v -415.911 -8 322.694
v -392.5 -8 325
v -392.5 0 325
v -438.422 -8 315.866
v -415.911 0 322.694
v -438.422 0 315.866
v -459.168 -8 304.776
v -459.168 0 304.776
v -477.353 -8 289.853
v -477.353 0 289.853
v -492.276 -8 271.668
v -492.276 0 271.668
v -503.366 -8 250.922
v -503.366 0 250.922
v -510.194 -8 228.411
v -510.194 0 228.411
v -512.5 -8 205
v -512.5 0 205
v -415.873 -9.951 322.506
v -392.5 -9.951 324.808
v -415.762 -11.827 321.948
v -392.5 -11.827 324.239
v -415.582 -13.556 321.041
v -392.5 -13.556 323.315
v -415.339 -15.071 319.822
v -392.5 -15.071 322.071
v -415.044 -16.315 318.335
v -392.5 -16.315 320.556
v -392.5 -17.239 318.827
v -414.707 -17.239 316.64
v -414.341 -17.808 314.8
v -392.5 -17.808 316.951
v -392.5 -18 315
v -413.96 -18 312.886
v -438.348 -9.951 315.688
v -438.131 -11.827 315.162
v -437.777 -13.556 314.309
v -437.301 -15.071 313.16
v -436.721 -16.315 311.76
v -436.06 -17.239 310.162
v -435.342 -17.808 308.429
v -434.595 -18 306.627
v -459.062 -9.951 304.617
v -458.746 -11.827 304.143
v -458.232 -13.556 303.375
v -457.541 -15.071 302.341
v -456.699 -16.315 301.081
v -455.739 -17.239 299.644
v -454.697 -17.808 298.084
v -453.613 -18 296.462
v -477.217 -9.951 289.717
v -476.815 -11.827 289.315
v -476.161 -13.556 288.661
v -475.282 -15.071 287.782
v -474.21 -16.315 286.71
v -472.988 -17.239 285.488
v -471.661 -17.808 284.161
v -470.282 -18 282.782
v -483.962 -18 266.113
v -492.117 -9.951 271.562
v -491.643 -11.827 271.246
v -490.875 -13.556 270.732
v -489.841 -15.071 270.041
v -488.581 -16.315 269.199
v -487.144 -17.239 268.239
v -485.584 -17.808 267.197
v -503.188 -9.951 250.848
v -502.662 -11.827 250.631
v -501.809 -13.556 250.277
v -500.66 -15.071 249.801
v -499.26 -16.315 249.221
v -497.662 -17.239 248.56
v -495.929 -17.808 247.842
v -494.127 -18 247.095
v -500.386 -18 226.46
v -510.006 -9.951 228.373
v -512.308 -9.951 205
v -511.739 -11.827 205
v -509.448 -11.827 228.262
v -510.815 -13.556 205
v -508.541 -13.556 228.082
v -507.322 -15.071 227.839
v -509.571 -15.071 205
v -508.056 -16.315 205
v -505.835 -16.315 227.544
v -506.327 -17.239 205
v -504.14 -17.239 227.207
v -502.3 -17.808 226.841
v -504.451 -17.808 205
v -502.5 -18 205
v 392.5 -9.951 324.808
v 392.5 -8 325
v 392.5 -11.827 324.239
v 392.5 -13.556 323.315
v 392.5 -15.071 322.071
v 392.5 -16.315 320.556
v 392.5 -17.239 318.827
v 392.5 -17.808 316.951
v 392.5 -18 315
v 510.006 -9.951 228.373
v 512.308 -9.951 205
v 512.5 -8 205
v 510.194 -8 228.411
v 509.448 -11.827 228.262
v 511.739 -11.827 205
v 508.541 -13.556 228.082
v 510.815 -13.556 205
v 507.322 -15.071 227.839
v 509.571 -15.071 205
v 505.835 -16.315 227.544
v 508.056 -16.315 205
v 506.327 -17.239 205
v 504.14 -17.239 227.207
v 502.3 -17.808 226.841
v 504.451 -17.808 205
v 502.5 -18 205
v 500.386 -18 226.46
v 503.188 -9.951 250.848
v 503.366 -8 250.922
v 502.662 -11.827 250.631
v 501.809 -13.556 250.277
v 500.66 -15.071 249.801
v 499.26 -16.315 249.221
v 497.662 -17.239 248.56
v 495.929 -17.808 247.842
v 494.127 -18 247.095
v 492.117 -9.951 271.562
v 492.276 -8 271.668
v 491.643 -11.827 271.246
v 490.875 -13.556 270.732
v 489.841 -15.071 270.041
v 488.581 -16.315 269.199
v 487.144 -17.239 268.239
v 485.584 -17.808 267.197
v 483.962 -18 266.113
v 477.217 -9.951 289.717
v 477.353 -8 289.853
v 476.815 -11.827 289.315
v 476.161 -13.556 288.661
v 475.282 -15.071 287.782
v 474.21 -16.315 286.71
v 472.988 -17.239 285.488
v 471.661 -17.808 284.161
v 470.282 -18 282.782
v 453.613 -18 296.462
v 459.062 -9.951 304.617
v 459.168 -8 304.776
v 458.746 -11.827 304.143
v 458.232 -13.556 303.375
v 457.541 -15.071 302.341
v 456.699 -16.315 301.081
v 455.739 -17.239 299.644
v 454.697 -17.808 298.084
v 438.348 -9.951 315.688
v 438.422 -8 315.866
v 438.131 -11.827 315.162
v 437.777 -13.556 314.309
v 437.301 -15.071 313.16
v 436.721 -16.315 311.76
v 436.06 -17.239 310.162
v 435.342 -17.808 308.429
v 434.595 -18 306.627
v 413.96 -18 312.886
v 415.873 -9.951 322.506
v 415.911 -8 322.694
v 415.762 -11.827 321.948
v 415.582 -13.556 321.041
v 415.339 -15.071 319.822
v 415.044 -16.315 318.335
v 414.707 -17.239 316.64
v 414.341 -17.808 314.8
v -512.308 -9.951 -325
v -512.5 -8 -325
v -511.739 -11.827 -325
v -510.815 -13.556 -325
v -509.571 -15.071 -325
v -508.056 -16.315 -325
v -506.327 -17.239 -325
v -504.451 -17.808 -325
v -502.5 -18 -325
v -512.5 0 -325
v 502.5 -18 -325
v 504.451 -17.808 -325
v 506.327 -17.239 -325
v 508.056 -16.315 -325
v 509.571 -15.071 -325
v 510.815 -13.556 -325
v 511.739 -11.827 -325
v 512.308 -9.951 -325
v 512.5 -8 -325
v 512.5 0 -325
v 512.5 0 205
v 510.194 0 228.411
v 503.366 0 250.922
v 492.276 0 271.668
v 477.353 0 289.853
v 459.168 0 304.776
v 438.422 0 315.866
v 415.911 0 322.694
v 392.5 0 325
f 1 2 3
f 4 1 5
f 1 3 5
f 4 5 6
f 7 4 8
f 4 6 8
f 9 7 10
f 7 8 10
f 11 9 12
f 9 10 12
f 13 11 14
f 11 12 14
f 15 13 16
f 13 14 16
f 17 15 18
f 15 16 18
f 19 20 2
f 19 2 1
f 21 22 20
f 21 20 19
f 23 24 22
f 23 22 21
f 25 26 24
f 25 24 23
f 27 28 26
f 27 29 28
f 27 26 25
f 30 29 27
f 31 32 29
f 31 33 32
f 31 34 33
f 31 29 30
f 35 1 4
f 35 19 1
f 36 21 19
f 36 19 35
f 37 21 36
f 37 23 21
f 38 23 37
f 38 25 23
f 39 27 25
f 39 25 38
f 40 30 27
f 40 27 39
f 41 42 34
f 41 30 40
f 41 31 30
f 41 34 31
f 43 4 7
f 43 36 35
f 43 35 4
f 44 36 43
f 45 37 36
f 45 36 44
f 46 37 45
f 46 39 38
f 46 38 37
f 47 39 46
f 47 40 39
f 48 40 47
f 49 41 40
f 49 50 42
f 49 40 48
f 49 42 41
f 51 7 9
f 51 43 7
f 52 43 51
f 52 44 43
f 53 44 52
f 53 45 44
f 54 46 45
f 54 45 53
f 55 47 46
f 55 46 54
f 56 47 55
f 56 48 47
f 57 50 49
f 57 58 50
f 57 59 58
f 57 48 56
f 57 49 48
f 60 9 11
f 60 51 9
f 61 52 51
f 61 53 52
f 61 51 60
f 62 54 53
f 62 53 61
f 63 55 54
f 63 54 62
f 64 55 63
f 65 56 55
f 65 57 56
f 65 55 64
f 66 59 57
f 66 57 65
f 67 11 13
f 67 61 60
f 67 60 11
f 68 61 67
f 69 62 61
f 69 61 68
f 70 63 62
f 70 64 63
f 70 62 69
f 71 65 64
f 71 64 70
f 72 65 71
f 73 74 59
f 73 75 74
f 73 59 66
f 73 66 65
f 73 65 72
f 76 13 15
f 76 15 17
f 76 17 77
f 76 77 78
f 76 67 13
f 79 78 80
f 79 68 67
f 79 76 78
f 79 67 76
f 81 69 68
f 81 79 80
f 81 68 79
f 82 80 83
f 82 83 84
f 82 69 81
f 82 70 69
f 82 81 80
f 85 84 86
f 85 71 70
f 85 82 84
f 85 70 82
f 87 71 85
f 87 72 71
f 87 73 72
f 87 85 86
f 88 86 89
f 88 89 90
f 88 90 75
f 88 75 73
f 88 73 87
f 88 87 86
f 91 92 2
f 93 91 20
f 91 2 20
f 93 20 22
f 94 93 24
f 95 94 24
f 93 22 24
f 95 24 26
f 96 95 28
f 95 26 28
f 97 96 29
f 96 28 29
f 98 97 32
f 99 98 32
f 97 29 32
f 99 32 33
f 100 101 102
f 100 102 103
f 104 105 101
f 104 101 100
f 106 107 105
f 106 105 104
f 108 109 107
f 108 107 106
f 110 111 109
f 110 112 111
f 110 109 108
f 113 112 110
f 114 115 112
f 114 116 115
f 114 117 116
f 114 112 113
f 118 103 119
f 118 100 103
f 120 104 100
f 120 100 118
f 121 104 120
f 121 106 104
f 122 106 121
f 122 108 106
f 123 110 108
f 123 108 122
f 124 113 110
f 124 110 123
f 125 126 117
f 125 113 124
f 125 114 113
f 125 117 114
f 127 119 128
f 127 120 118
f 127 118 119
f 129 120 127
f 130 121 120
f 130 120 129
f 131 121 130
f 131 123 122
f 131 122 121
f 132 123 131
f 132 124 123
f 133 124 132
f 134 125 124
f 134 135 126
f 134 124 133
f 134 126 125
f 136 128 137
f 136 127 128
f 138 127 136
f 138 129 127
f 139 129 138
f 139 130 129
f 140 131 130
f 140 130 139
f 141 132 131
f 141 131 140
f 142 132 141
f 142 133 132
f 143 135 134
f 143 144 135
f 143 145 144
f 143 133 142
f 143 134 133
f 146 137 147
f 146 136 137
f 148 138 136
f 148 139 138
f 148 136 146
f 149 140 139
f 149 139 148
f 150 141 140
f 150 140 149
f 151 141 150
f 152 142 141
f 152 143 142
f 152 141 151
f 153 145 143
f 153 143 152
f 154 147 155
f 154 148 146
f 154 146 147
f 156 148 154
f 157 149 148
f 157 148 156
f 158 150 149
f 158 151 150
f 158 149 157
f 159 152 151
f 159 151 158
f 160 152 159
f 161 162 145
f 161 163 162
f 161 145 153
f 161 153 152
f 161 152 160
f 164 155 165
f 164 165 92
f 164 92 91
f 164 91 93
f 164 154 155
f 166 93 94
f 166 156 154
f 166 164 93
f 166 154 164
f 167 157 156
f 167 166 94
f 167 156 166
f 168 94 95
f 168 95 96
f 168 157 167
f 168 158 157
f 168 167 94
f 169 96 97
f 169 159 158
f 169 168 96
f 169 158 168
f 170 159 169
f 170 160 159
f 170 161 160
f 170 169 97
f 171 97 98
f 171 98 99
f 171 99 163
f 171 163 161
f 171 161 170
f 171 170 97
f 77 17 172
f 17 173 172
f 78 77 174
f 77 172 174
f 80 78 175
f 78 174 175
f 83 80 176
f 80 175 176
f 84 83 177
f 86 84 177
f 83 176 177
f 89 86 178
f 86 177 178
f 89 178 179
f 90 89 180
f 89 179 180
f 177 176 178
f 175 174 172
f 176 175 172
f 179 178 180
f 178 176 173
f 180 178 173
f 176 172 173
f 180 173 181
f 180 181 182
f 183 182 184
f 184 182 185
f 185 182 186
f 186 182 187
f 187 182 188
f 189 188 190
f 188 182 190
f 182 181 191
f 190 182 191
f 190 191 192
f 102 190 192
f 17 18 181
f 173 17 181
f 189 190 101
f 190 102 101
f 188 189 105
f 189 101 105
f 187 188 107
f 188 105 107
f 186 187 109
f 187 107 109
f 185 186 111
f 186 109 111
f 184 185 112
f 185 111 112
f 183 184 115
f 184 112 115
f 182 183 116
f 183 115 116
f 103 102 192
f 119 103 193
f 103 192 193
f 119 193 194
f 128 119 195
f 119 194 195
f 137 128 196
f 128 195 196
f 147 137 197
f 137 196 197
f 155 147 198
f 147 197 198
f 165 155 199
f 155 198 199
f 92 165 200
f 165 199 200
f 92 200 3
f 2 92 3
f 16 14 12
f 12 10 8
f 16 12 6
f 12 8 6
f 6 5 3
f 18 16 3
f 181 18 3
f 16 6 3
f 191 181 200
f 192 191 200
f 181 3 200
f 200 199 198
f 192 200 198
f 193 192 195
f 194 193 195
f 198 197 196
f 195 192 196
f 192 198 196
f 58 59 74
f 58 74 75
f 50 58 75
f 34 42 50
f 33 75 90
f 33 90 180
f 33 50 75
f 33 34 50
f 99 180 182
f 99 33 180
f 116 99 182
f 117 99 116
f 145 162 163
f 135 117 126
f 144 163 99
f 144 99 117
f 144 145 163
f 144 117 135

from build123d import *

# Parameters (mm, degrees)
F1_DEPTH = 18
F2_R     = 10


with BuildPart() as f1:
    # F0 (on Front) → F1 (new body)
    with BuildSketch(Plane.XZ):
        with BuildLine():
            ThreePointArc((512.5, 205), (477.352814, 289.852814), (392.5, 325))
            Line((392.5, 325), (-392.5, 325))
            ThreePointArc((-392.5, 325), (-477.352814, 289.852814), (-512.5, 205))
            Line((-512.5, 205), (-512.5, -325))
            Line((-512.5, -325), (512.5, -325))
            Line((512.5, -325), (512.5, 205))
        make_face()
    extrude(amount=F1_DEPTH)

    # F2
    f2_edges = [f1.edges().sort_by_distance(p)[0] for p in [
        (0, -18, 325),
    ]]
    fillet(f2_edges, radius=F2_R)


solid = f1.part
